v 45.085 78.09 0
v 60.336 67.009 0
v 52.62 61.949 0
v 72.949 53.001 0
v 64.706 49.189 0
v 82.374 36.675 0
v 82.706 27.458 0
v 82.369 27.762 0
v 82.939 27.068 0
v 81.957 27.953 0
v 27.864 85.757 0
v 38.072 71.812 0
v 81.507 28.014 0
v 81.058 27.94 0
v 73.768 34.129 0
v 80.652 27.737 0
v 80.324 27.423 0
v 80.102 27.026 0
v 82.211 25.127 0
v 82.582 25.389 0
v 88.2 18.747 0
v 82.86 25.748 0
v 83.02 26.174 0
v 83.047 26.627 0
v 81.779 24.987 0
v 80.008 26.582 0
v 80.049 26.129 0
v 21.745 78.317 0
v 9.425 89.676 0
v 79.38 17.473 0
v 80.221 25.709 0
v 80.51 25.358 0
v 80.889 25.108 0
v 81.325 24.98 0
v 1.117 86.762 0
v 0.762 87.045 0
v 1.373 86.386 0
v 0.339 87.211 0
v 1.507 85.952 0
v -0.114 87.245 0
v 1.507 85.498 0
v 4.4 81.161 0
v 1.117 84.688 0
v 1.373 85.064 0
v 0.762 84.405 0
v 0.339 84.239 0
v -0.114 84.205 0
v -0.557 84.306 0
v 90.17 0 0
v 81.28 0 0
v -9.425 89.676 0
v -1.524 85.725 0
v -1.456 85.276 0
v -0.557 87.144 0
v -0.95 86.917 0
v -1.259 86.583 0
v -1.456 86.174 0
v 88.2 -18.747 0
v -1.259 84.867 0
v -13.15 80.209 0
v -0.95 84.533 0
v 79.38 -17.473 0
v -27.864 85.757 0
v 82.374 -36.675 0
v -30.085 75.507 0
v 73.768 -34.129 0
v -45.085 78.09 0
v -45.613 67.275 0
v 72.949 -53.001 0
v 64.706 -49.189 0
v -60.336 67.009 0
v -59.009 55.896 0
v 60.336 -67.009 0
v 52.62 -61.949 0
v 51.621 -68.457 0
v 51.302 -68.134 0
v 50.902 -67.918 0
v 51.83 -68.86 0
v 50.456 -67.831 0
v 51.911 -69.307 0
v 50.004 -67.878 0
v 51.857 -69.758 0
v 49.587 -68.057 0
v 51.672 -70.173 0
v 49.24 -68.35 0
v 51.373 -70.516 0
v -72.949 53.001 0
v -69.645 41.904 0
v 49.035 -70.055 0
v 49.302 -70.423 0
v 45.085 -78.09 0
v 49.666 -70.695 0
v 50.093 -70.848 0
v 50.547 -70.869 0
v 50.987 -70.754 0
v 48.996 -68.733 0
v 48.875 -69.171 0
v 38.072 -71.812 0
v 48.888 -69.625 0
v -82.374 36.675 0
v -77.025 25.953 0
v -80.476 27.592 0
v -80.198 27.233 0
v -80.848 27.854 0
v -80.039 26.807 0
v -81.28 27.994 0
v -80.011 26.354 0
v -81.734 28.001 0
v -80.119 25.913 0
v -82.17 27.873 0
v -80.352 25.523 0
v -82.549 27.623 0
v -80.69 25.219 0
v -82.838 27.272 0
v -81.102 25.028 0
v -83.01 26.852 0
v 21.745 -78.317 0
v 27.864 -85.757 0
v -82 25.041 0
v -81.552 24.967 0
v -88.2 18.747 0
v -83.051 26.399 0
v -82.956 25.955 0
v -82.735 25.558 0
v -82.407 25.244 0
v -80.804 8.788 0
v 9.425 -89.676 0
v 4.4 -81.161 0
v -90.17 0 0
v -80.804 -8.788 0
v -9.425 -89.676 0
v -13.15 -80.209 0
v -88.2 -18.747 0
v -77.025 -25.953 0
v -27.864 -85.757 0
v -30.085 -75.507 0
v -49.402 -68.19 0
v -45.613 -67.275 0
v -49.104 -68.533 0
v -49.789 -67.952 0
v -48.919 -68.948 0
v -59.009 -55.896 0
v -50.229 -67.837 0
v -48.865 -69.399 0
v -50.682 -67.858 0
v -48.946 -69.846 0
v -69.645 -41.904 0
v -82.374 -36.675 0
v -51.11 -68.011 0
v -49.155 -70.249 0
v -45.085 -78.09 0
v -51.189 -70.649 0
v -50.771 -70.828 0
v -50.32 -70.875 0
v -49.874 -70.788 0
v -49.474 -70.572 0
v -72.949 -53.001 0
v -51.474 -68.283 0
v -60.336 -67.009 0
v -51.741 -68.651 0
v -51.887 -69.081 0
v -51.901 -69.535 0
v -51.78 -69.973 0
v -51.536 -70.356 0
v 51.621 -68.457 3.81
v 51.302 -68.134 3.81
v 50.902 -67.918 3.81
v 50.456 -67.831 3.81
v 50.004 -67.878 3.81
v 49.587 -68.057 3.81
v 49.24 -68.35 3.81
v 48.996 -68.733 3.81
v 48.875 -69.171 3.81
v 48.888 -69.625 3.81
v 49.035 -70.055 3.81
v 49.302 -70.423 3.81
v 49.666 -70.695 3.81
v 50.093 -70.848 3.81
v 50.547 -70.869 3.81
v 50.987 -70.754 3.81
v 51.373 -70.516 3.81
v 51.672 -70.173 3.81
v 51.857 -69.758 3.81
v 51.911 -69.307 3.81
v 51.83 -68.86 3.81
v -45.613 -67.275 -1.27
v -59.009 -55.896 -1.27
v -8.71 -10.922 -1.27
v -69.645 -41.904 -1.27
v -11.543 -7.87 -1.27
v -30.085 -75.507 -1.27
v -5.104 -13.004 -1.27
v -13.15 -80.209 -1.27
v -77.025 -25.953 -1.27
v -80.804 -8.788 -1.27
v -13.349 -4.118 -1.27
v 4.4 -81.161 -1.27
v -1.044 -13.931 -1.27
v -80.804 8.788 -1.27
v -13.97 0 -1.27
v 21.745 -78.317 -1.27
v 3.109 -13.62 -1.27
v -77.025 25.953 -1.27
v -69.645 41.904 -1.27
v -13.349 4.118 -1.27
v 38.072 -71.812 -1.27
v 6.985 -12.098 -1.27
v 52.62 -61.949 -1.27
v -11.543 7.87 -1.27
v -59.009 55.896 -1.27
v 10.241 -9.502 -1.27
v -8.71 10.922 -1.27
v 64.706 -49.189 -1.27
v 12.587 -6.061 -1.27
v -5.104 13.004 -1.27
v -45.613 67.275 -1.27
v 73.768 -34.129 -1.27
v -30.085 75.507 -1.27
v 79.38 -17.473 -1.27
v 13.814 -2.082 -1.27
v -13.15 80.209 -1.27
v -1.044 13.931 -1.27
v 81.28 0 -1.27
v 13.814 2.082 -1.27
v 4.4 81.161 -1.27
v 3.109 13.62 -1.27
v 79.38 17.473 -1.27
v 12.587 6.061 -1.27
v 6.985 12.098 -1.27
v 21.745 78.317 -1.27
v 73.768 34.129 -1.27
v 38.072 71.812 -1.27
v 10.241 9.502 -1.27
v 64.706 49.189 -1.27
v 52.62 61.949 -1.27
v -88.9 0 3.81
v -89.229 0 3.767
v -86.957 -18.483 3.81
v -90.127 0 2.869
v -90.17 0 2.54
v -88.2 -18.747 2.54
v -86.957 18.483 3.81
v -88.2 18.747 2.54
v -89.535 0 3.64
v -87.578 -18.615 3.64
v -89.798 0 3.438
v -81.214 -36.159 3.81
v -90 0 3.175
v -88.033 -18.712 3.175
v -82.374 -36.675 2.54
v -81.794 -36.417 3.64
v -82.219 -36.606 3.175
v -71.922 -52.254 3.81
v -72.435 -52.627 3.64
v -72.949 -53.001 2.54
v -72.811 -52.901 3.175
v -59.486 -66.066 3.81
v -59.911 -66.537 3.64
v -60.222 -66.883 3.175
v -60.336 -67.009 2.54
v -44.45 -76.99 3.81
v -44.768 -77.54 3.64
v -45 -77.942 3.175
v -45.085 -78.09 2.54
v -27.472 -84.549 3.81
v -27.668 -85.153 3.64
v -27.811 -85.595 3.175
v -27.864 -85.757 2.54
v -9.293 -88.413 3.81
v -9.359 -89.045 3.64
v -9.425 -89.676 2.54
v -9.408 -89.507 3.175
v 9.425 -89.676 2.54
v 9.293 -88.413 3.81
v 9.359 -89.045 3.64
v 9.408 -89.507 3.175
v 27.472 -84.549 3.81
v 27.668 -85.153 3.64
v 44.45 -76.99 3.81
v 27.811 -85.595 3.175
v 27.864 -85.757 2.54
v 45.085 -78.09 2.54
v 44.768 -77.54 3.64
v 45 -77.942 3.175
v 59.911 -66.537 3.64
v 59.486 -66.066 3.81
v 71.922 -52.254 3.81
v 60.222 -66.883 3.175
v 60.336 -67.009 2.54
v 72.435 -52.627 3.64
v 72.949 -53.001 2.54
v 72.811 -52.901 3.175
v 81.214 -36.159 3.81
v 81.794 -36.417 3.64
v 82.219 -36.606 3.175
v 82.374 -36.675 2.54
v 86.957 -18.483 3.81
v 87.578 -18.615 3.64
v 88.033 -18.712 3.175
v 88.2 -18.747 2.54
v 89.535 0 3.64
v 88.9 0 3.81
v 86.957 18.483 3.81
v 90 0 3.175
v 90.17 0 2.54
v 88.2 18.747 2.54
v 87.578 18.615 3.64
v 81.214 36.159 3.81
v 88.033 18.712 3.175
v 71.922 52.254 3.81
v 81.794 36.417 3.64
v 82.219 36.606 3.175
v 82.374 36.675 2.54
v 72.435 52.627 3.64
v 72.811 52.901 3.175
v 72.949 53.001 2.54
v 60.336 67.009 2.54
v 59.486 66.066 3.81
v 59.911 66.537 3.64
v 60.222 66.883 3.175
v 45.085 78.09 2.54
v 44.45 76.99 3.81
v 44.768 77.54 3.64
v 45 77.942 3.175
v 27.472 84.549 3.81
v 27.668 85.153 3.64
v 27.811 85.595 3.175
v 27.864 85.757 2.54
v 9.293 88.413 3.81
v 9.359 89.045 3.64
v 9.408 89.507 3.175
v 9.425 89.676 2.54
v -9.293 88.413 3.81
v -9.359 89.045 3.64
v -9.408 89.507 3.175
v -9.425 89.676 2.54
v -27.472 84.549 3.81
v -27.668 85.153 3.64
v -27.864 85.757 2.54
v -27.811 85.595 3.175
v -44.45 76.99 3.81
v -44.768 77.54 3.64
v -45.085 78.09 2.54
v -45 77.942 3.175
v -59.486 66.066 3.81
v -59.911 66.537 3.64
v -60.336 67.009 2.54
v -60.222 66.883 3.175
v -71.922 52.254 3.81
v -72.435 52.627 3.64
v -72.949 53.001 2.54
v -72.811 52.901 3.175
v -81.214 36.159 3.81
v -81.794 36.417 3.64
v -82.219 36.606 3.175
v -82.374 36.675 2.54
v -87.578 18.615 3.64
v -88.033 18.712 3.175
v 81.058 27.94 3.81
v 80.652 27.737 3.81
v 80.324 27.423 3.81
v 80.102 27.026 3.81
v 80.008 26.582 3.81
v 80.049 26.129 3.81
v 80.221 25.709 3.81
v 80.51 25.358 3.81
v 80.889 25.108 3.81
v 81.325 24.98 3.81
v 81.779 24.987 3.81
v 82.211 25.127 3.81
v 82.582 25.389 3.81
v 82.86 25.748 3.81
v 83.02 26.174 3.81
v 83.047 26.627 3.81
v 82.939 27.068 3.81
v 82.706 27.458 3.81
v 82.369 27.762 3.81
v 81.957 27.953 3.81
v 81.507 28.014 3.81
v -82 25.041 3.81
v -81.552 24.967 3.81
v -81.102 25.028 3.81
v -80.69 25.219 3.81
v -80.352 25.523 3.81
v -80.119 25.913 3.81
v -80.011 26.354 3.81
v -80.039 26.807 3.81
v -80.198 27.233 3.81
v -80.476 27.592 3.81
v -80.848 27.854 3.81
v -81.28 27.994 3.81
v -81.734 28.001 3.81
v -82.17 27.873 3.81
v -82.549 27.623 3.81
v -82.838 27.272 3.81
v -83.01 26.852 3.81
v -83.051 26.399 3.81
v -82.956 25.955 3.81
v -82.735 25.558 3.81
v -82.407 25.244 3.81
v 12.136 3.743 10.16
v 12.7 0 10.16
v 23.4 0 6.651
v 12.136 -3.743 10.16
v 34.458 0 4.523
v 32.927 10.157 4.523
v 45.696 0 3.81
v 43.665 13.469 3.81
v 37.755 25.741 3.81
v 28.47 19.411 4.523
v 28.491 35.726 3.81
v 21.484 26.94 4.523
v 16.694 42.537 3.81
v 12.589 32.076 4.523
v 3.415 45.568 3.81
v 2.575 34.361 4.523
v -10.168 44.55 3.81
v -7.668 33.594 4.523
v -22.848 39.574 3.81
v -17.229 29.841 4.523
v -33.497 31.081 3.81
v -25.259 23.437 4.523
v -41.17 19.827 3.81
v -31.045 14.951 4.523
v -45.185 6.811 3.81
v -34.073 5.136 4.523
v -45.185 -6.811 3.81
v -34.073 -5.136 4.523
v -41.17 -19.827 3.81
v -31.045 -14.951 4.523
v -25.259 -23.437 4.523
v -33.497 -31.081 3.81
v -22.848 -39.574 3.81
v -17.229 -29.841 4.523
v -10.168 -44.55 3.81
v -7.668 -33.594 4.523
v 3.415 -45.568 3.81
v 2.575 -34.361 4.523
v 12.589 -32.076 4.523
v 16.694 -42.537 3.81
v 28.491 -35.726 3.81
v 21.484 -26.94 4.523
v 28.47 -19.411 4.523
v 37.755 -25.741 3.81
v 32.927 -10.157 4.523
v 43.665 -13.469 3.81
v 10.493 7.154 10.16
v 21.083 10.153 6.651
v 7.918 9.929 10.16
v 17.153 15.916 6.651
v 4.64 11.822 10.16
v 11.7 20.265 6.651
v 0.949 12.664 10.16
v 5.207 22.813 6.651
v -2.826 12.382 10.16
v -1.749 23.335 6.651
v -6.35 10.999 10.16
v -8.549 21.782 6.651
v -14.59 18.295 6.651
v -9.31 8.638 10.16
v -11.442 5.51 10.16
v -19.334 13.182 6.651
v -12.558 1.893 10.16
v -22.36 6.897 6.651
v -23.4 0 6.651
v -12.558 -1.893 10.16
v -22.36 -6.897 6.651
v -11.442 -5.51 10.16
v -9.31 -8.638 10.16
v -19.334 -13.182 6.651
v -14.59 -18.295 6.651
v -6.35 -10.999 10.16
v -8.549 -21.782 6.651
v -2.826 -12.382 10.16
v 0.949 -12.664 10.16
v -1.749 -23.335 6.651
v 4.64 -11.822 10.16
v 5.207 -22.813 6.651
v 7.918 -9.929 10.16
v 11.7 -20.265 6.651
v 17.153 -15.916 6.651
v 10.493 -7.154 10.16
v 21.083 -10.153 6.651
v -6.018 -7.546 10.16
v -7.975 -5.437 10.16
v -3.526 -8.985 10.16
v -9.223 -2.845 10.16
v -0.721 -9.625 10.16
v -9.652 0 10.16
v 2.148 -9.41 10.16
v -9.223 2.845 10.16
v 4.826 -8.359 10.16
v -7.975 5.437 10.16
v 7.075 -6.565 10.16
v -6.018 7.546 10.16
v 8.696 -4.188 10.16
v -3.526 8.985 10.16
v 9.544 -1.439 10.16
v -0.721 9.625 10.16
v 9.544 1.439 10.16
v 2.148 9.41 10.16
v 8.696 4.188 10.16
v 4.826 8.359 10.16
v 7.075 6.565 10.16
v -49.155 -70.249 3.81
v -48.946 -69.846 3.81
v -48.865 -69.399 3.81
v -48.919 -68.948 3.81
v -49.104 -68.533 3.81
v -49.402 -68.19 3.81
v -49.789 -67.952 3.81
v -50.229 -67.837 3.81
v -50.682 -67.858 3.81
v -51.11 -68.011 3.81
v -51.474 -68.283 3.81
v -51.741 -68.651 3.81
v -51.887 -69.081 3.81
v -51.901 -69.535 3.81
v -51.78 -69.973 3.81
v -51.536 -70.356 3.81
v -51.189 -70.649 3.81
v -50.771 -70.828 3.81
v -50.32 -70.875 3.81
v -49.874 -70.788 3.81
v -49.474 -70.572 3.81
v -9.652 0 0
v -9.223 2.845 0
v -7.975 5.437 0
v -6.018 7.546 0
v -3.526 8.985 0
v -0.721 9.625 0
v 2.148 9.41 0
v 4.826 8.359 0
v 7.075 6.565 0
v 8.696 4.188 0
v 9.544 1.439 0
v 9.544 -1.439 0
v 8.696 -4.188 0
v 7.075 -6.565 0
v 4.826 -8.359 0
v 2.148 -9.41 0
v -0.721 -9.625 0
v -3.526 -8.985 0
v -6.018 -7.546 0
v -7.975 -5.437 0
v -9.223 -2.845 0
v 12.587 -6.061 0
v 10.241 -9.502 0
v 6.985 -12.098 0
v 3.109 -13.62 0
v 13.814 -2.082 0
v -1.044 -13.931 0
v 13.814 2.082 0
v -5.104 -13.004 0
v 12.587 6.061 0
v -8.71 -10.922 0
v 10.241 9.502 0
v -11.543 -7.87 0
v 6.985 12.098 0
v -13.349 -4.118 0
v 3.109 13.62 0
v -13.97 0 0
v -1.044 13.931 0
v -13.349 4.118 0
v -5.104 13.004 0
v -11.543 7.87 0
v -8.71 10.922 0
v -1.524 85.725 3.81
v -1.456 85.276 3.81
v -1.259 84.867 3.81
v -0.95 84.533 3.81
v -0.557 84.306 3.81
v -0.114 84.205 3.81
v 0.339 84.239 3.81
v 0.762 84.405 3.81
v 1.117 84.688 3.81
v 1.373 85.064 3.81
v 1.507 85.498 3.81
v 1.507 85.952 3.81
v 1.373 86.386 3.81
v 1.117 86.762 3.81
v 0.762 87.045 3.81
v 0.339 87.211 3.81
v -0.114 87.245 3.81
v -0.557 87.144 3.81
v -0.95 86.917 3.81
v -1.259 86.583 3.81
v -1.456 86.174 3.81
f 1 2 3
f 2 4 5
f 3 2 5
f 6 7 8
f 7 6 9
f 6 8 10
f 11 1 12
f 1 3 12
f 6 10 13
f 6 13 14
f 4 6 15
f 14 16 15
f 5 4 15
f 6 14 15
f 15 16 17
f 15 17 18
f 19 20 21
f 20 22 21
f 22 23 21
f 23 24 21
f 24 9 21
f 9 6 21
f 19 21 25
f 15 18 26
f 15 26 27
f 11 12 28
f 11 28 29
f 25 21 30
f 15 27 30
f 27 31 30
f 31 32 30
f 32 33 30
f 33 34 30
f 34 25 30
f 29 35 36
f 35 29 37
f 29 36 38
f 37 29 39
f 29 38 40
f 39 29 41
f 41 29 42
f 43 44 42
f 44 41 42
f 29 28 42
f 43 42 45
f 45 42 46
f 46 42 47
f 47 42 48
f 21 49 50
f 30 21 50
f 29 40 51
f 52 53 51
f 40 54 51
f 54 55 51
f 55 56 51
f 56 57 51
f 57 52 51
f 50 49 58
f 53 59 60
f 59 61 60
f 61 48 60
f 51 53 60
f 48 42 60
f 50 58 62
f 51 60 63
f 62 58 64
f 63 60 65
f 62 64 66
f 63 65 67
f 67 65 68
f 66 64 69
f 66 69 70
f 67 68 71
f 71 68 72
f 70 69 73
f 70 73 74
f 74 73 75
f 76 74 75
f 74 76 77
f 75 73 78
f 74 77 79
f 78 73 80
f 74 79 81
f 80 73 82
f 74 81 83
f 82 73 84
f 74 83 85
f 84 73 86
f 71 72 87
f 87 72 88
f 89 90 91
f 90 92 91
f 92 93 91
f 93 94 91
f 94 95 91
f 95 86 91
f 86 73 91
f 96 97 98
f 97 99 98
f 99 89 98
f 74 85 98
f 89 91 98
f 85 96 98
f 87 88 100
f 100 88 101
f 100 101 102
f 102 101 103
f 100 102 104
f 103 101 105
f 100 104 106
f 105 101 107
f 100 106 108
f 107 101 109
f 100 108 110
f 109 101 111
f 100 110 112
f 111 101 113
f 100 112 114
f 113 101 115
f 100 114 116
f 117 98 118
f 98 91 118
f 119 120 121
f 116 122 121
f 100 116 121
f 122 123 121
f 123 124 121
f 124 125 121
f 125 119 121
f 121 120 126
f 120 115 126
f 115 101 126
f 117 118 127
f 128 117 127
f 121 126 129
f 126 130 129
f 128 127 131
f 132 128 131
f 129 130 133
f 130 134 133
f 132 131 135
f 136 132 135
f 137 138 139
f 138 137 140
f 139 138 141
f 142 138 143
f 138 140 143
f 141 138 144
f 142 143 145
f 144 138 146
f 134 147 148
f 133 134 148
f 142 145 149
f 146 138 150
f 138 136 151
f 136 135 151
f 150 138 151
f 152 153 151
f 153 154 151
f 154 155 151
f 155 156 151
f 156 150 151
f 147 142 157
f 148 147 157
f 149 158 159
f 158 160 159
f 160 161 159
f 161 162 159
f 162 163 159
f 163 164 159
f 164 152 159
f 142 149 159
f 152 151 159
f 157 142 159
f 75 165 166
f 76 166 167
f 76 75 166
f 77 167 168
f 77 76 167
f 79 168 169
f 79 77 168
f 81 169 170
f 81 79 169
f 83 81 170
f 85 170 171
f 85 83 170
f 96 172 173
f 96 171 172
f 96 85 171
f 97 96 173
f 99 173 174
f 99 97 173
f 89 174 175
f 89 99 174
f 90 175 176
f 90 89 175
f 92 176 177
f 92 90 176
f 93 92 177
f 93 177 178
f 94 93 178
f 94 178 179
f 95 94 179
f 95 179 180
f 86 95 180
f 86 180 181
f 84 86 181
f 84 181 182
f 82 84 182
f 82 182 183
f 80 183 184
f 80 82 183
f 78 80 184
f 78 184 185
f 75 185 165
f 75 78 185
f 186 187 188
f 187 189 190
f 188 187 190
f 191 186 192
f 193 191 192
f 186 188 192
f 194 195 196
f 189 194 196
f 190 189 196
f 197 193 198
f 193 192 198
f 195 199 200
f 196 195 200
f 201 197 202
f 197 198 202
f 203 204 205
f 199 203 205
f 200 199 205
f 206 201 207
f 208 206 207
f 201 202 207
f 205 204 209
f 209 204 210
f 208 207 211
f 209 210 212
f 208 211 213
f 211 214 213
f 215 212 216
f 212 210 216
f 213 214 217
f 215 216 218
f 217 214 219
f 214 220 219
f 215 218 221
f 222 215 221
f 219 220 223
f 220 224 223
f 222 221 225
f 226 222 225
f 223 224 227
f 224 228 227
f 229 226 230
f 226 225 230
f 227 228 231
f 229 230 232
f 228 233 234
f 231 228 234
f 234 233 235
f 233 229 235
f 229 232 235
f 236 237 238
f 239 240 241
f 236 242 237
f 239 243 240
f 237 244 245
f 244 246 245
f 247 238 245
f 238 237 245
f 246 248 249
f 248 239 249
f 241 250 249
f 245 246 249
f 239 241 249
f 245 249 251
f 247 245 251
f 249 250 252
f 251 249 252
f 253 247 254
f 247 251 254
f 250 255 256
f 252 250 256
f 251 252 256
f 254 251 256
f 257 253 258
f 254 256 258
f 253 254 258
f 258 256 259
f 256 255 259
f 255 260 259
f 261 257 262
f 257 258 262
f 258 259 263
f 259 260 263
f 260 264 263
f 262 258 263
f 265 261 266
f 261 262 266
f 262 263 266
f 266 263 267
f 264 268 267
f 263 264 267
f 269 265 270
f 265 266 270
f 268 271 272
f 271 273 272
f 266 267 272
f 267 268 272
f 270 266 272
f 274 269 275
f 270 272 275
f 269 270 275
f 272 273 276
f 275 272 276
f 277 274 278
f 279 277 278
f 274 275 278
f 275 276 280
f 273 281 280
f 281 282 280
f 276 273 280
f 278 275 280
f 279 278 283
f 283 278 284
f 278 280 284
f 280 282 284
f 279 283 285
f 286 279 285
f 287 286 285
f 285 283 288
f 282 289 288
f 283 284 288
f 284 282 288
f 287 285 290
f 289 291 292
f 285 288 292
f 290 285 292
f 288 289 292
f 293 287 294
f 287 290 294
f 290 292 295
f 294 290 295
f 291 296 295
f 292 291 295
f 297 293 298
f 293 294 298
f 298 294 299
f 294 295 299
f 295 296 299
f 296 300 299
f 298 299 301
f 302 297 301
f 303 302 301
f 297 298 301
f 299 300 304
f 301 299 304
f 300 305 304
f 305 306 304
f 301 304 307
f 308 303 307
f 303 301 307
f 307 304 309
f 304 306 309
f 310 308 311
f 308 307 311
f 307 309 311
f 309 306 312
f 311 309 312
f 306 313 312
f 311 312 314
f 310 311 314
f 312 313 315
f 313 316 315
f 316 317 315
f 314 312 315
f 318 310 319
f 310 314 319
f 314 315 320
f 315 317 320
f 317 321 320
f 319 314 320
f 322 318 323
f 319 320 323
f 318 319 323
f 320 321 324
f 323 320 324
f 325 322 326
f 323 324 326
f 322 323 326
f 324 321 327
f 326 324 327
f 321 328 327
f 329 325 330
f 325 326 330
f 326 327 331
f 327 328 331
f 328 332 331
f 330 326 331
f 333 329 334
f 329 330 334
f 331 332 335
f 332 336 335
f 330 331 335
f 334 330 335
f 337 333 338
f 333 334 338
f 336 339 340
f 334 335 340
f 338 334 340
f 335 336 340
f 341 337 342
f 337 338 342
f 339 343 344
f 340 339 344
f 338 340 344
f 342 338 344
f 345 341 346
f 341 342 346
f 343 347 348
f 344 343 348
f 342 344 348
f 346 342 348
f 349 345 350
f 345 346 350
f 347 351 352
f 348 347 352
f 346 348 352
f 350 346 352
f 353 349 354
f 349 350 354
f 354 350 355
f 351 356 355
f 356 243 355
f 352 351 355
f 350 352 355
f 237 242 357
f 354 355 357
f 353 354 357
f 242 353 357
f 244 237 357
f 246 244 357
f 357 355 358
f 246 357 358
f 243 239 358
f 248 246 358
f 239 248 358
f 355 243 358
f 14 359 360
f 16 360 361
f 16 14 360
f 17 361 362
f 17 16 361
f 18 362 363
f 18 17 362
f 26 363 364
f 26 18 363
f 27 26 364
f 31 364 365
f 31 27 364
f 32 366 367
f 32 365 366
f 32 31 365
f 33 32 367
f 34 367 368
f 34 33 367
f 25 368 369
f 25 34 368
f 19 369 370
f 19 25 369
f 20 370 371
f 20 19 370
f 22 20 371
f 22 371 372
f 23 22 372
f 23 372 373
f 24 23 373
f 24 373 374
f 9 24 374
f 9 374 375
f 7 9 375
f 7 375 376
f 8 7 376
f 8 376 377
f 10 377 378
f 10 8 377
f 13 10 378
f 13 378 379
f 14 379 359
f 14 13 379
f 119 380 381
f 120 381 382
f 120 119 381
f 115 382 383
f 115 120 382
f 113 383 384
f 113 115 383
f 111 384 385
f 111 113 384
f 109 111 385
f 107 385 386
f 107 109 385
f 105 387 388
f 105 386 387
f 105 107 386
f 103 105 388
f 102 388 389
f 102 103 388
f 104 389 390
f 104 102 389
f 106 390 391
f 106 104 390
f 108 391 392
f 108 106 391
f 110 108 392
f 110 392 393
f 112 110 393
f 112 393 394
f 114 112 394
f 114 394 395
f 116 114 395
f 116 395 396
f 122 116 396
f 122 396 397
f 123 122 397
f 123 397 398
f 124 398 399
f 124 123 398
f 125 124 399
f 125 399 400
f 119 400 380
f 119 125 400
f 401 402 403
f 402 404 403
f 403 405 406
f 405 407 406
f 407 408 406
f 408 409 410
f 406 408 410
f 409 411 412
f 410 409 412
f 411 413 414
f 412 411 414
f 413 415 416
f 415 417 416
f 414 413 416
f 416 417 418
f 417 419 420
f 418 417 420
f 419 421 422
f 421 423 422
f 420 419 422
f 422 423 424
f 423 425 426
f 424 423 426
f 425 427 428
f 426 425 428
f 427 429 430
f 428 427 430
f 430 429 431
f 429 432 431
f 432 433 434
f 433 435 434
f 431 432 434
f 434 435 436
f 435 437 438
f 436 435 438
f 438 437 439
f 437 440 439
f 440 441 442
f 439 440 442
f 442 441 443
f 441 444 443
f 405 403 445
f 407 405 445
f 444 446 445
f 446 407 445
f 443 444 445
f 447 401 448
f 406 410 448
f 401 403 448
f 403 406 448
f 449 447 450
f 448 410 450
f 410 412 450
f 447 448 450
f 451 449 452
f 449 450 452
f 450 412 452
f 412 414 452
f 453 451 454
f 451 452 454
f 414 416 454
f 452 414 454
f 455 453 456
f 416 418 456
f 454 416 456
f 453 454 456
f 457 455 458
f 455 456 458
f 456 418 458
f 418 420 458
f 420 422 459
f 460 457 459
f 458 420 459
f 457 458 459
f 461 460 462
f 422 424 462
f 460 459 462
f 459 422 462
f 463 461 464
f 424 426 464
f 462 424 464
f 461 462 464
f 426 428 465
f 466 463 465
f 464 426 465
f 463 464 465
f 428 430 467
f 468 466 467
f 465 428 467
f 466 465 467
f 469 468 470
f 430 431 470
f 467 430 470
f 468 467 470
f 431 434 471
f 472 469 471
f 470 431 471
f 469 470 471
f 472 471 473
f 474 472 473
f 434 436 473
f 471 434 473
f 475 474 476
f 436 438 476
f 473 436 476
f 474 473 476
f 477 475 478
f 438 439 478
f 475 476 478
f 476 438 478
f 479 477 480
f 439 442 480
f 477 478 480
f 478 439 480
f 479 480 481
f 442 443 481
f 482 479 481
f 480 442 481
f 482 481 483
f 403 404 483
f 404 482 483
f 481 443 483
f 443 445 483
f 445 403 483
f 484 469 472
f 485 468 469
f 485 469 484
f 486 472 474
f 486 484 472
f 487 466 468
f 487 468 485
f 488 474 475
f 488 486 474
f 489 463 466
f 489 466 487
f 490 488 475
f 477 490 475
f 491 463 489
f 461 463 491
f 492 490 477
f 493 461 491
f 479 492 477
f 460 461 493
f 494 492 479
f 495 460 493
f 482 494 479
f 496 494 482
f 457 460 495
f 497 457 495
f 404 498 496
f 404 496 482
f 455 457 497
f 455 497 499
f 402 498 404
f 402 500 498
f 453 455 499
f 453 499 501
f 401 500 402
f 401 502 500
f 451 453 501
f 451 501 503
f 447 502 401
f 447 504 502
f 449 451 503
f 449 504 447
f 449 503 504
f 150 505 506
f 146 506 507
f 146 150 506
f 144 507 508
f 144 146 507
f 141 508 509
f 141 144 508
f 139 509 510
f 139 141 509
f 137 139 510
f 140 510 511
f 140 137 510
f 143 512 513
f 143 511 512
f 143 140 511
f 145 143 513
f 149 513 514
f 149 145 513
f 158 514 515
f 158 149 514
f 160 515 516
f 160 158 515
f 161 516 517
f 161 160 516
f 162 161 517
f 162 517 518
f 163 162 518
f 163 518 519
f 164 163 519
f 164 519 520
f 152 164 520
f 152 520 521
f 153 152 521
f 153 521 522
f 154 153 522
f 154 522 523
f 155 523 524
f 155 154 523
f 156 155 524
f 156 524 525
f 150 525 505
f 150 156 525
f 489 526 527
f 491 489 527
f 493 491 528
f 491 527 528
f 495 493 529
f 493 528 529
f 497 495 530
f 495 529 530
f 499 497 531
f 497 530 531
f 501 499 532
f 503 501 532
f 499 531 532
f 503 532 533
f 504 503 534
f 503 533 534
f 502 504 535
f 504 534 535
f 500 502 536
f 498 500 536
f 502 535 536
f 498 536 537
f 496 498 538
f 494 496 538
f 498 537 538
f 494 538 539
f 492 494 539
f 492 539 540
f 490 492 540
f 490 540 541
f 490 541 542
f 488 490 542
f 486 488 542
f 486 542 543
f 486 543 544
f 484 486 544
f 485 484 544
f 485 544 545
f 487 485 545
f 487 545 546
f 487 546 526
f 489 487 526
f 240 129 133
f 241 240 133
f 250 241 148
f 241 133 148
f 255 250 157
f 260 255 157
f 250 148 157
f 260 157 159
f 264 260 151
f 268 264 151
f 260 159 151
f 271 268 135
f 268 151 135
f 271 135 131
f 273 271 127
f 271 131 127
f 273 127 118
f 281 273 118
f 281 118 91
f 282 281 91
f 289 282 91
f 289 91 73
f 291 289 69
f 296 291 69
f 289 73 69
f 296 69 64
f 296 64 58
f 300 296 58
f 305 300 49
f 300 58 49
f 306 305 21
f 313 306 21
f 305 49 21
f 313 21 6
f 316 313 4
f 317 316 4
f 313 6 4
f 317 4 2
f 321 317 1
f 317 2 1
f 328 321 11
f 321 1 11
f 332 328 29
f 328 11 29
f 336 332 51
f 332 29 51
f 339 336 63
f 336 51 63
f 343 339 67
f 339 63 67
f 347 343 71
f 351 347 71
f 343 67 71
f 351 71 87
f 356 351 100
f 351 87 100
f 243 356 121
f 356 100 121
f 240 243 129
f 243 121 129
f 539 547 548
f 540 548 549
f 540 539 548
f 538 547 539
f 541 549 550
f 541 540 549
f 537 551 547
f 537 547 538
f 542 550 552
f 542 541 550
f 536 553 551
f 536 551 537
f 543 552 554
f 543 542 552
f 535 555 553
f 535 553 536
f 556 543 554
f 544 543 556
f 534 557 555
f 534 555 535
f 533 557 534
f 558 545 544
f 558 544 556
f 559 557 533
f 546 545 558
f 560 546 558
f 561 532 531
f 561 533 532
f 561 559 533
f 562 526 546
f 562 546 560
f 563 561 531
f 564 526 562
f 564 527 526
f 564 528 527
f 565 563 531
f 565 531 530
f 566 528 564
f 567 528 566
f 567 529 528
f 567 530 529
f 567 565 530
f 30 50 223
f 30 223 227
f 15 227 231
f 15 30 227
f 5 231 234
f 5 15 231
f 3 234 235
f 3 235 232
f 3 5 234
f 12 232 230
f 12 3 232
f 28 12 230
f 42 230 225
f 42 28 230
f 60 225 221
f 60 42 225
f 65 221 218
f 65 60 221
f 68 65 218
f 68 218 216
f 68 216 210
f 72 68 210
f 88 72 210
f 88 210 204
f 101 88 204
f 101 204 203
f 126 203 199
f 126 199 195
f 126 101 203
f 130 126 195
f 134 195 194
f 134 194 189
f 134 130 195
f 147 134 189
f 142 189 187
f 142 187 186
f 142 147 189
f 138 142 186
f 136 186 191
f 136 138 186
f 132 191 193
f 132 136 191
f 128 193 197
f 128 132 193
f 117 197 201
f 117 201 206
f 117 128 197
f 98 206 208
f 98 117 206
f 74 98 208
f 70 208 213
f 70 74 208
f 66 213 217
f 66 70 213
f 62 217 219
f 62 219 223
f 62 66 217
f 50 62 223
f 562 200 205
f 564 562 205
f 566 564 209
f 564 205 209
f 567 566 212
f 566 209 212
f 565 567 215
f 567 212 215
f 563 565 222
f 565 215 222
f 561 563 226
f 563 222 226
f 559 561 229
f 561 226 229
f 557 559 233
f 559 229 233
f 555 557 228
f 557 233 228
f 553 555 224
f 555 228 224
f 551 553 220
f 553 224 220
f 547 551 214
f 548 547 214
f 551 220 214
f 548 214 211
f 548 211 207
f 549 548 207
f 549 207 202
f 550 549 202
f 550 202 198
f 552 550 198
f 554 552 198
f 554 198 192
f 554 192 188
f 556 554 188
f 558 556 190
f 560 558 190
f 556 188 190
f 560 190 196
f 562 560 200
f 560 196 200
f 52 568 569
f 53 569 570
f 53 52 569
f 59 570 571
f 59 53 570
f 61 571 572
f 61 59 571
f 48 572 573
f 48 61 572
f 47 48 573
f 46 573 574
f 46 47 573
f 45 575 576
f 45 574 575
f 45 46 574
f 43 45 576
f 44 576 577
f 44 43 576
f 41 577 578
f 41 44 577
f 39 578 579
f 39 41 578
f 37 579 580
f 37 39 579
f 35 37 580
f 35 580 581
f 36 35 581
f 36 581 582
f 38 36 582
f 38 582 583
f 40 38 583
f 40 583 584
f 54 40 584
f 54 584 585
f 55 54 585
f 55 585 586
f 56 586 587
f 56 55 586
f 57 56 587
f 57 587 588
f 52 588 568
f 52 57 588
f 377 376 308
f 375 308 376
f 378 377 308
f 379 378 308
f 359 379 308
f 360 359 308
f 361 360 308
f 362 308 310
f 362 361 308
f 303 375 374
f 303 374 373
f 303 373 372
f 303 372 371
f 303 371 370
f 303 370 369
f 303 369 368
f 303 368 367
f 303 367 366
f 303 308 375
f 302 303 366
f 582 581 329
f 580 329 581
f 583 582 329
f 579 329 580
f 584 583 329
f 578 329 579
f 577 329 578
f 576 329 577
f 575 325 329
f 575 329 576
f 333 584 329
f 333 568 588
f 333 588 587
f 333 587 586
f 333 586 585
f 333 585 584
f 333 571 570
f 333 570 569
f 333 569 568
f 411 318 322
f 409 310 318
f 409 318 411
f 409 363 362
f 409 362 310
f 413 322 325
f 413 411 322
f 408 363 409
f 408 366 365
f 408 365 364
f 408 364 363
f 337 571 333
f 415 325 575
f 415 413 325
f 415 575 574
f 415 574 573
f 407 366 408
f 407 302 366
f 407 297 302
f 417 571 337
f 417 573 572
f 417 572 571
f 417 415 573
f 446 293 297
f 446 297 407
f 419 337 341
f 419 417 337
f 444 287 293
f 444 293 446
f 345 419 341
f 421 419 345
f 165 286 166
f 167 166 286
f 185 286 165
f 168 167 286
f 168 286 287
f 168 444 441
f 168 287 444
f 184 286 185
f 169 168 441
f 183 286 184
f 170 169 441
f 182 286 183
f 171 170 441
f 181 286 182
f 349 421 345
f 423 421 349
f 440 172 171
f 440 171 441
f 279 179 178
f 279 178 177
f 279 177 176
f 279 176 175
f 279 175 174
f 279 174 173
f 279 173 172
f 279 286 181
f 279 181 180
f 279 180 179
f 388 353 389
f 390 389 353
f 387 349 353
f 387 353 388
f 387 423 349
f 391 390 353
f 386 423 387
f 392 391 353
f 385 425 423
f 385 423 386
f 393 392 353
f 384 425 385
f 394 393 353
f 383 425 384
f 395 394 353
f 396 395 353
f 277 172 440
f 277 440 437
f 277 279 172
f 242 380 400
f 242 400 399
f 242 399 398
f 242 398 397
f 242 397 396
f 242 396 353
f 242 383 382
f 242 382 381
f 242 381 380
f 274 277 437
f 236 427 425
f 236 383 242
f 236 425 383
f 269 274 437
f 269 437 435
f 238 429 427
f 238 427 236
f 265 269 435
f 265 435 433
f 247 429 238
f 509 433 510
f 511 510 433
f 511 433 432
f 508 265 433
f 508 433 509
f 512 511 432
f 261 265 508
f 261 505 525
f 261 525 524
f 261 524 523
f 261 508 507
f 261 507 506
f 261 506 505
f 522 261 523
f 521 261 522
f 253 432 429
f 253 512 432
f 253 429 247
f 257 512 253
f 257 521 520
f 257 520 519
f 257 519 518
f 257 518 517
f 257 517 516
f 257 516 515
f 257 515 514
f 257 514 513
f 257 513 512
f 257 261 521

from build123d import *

# Parameters (mm, degrees)
SKETCH2_R           = 81.28
BOSS_EXTRUDE1_DEPTH = 1.27
SKETCH3_R           = 90.17
BOSS_EXTRUDE2_DEPTH = 3.81
SKETCH4_R           = 1.524
CUT_EXTRUDE2_DEPTH  = 128.576541339
CIRPATTERN1_COUNT   = 5
SKETCH14_R          = 12.7
SKETCH14_R_2        = 6.477
BOSS_EXTRUDE3_DEPTH = 6.35
SKETCH23_R          = 13.97
CUT_EXTRUDE3_DEPTH  = 1.27
SKETCH24_R          = 9.652
CUT_EXTRUDE4_DEPTH  = 128.923740564
FILLET1_R           = 88.9
FILLET2_R           = 1.27


with BuildPart() as part:
    # Sketch2 → Boss-Extrude1 (new body)
    with BuildSketch(Plane.XY):
        Circle(SKETCH2_R)
    extrude(amount=-BOSS_EXTRUDE1_DEPTH)

    # Sketch3 → Boss-Extrude2 (add)
    with BuildSketch(Plane.XY):
        with Locations(Location((0, 0, 0), (0, 0, 180))):
            Circle(SKETCH3_R)
    extrude(amount=BOSS_EXTRUDE2_DEPTH)

    # Sketch4 → Cut-Extrude2 (cut, through all)
    with BuildSketch(Plane.XY):
        with Locations(Location((0, 85.725, 0), (0, 0, 180))):
            Circle(SKETCH4_R)
    cut_extrude2 = extrude(amount=CUT_EXTRUDE2_DEPTH, mode=Mode.SUBTRACT)

    # CirPattern1: Cut-Extrude2 ×5 about axis
    cirpattern1_axis = Axis((0, 0, 0), (0, 0, 1))
    for i in range(1, CIRPATTERN1_COUNT):
        add(cut_extrude2.rotate(cirpattern1_axis, i * 360 / CIRPATTERN1_COUNT), mode=Mode.SUBTRACT)

    # Sketch14 → Boss-Extrude3 (add)
    with BuildSketch(Plane.XY.offset(3.81)):
        Circle(SKETCH14_R)
        Circle(SKETCH14_R_2, mode=Mode.SUBTRACT)
    extrude(amount=BOSS_EXTRUDE3_DEPTH)

    # Sketch23 → Cut-Extrude3 (cut)
    with BuildSketch(Plane(origin=(0, 0, -1.27), x_dir=(-1, 0, 0), z_dir=(0, 0, -1))):
        Circle(SKETCH23_R)
    extrude(amount=-CUT_EXTRUDE3_DEPTH, mode=Mode.SUBTRACT)

    # Sketch24 → Cut-Extrude4 (cut, through all)
    with BuildSketch(Plane(origin=(0, 0, 0), x_dir=(-1, 0, 0), z_dir=(0, 0, -1))):
        Circle(SKETCH24_R)
    extrude(amount=-CUT_EXTRUDE4_DEPTH, mode=Mode.SUBTRACT)

    # Fillet1
    # the kernel refuses this fillet: 88.9 mm, written as the material it adds along each edge
    with BuildSketch(Plane(origin=(0, 0, 3.81), x_dir=(1, 0, 0), z_dir=(0, -1, 0))) as fillet1_piece_1:
        with BuildLine():
            CenterArc((45.695567884, 88.9), FILLET1_R, 248.213210702, 21.786789298)
            Line((12.7, 6.35), (12.7, 0))
            Line((12.7, 0), (45.695567884, 0))
        make_face()
    revolve(axis=Axis((0, 0, 3.81), (0, 0, 1)))

    # Fillet2
    fillet2_edges = [part.edges().sort_by_distance(p)[0] for p in [
        (90.17, 0, 3.81),
    ]]
    fillet(fillet2_edges, radius=FILLET2_R)


solid = part.part
